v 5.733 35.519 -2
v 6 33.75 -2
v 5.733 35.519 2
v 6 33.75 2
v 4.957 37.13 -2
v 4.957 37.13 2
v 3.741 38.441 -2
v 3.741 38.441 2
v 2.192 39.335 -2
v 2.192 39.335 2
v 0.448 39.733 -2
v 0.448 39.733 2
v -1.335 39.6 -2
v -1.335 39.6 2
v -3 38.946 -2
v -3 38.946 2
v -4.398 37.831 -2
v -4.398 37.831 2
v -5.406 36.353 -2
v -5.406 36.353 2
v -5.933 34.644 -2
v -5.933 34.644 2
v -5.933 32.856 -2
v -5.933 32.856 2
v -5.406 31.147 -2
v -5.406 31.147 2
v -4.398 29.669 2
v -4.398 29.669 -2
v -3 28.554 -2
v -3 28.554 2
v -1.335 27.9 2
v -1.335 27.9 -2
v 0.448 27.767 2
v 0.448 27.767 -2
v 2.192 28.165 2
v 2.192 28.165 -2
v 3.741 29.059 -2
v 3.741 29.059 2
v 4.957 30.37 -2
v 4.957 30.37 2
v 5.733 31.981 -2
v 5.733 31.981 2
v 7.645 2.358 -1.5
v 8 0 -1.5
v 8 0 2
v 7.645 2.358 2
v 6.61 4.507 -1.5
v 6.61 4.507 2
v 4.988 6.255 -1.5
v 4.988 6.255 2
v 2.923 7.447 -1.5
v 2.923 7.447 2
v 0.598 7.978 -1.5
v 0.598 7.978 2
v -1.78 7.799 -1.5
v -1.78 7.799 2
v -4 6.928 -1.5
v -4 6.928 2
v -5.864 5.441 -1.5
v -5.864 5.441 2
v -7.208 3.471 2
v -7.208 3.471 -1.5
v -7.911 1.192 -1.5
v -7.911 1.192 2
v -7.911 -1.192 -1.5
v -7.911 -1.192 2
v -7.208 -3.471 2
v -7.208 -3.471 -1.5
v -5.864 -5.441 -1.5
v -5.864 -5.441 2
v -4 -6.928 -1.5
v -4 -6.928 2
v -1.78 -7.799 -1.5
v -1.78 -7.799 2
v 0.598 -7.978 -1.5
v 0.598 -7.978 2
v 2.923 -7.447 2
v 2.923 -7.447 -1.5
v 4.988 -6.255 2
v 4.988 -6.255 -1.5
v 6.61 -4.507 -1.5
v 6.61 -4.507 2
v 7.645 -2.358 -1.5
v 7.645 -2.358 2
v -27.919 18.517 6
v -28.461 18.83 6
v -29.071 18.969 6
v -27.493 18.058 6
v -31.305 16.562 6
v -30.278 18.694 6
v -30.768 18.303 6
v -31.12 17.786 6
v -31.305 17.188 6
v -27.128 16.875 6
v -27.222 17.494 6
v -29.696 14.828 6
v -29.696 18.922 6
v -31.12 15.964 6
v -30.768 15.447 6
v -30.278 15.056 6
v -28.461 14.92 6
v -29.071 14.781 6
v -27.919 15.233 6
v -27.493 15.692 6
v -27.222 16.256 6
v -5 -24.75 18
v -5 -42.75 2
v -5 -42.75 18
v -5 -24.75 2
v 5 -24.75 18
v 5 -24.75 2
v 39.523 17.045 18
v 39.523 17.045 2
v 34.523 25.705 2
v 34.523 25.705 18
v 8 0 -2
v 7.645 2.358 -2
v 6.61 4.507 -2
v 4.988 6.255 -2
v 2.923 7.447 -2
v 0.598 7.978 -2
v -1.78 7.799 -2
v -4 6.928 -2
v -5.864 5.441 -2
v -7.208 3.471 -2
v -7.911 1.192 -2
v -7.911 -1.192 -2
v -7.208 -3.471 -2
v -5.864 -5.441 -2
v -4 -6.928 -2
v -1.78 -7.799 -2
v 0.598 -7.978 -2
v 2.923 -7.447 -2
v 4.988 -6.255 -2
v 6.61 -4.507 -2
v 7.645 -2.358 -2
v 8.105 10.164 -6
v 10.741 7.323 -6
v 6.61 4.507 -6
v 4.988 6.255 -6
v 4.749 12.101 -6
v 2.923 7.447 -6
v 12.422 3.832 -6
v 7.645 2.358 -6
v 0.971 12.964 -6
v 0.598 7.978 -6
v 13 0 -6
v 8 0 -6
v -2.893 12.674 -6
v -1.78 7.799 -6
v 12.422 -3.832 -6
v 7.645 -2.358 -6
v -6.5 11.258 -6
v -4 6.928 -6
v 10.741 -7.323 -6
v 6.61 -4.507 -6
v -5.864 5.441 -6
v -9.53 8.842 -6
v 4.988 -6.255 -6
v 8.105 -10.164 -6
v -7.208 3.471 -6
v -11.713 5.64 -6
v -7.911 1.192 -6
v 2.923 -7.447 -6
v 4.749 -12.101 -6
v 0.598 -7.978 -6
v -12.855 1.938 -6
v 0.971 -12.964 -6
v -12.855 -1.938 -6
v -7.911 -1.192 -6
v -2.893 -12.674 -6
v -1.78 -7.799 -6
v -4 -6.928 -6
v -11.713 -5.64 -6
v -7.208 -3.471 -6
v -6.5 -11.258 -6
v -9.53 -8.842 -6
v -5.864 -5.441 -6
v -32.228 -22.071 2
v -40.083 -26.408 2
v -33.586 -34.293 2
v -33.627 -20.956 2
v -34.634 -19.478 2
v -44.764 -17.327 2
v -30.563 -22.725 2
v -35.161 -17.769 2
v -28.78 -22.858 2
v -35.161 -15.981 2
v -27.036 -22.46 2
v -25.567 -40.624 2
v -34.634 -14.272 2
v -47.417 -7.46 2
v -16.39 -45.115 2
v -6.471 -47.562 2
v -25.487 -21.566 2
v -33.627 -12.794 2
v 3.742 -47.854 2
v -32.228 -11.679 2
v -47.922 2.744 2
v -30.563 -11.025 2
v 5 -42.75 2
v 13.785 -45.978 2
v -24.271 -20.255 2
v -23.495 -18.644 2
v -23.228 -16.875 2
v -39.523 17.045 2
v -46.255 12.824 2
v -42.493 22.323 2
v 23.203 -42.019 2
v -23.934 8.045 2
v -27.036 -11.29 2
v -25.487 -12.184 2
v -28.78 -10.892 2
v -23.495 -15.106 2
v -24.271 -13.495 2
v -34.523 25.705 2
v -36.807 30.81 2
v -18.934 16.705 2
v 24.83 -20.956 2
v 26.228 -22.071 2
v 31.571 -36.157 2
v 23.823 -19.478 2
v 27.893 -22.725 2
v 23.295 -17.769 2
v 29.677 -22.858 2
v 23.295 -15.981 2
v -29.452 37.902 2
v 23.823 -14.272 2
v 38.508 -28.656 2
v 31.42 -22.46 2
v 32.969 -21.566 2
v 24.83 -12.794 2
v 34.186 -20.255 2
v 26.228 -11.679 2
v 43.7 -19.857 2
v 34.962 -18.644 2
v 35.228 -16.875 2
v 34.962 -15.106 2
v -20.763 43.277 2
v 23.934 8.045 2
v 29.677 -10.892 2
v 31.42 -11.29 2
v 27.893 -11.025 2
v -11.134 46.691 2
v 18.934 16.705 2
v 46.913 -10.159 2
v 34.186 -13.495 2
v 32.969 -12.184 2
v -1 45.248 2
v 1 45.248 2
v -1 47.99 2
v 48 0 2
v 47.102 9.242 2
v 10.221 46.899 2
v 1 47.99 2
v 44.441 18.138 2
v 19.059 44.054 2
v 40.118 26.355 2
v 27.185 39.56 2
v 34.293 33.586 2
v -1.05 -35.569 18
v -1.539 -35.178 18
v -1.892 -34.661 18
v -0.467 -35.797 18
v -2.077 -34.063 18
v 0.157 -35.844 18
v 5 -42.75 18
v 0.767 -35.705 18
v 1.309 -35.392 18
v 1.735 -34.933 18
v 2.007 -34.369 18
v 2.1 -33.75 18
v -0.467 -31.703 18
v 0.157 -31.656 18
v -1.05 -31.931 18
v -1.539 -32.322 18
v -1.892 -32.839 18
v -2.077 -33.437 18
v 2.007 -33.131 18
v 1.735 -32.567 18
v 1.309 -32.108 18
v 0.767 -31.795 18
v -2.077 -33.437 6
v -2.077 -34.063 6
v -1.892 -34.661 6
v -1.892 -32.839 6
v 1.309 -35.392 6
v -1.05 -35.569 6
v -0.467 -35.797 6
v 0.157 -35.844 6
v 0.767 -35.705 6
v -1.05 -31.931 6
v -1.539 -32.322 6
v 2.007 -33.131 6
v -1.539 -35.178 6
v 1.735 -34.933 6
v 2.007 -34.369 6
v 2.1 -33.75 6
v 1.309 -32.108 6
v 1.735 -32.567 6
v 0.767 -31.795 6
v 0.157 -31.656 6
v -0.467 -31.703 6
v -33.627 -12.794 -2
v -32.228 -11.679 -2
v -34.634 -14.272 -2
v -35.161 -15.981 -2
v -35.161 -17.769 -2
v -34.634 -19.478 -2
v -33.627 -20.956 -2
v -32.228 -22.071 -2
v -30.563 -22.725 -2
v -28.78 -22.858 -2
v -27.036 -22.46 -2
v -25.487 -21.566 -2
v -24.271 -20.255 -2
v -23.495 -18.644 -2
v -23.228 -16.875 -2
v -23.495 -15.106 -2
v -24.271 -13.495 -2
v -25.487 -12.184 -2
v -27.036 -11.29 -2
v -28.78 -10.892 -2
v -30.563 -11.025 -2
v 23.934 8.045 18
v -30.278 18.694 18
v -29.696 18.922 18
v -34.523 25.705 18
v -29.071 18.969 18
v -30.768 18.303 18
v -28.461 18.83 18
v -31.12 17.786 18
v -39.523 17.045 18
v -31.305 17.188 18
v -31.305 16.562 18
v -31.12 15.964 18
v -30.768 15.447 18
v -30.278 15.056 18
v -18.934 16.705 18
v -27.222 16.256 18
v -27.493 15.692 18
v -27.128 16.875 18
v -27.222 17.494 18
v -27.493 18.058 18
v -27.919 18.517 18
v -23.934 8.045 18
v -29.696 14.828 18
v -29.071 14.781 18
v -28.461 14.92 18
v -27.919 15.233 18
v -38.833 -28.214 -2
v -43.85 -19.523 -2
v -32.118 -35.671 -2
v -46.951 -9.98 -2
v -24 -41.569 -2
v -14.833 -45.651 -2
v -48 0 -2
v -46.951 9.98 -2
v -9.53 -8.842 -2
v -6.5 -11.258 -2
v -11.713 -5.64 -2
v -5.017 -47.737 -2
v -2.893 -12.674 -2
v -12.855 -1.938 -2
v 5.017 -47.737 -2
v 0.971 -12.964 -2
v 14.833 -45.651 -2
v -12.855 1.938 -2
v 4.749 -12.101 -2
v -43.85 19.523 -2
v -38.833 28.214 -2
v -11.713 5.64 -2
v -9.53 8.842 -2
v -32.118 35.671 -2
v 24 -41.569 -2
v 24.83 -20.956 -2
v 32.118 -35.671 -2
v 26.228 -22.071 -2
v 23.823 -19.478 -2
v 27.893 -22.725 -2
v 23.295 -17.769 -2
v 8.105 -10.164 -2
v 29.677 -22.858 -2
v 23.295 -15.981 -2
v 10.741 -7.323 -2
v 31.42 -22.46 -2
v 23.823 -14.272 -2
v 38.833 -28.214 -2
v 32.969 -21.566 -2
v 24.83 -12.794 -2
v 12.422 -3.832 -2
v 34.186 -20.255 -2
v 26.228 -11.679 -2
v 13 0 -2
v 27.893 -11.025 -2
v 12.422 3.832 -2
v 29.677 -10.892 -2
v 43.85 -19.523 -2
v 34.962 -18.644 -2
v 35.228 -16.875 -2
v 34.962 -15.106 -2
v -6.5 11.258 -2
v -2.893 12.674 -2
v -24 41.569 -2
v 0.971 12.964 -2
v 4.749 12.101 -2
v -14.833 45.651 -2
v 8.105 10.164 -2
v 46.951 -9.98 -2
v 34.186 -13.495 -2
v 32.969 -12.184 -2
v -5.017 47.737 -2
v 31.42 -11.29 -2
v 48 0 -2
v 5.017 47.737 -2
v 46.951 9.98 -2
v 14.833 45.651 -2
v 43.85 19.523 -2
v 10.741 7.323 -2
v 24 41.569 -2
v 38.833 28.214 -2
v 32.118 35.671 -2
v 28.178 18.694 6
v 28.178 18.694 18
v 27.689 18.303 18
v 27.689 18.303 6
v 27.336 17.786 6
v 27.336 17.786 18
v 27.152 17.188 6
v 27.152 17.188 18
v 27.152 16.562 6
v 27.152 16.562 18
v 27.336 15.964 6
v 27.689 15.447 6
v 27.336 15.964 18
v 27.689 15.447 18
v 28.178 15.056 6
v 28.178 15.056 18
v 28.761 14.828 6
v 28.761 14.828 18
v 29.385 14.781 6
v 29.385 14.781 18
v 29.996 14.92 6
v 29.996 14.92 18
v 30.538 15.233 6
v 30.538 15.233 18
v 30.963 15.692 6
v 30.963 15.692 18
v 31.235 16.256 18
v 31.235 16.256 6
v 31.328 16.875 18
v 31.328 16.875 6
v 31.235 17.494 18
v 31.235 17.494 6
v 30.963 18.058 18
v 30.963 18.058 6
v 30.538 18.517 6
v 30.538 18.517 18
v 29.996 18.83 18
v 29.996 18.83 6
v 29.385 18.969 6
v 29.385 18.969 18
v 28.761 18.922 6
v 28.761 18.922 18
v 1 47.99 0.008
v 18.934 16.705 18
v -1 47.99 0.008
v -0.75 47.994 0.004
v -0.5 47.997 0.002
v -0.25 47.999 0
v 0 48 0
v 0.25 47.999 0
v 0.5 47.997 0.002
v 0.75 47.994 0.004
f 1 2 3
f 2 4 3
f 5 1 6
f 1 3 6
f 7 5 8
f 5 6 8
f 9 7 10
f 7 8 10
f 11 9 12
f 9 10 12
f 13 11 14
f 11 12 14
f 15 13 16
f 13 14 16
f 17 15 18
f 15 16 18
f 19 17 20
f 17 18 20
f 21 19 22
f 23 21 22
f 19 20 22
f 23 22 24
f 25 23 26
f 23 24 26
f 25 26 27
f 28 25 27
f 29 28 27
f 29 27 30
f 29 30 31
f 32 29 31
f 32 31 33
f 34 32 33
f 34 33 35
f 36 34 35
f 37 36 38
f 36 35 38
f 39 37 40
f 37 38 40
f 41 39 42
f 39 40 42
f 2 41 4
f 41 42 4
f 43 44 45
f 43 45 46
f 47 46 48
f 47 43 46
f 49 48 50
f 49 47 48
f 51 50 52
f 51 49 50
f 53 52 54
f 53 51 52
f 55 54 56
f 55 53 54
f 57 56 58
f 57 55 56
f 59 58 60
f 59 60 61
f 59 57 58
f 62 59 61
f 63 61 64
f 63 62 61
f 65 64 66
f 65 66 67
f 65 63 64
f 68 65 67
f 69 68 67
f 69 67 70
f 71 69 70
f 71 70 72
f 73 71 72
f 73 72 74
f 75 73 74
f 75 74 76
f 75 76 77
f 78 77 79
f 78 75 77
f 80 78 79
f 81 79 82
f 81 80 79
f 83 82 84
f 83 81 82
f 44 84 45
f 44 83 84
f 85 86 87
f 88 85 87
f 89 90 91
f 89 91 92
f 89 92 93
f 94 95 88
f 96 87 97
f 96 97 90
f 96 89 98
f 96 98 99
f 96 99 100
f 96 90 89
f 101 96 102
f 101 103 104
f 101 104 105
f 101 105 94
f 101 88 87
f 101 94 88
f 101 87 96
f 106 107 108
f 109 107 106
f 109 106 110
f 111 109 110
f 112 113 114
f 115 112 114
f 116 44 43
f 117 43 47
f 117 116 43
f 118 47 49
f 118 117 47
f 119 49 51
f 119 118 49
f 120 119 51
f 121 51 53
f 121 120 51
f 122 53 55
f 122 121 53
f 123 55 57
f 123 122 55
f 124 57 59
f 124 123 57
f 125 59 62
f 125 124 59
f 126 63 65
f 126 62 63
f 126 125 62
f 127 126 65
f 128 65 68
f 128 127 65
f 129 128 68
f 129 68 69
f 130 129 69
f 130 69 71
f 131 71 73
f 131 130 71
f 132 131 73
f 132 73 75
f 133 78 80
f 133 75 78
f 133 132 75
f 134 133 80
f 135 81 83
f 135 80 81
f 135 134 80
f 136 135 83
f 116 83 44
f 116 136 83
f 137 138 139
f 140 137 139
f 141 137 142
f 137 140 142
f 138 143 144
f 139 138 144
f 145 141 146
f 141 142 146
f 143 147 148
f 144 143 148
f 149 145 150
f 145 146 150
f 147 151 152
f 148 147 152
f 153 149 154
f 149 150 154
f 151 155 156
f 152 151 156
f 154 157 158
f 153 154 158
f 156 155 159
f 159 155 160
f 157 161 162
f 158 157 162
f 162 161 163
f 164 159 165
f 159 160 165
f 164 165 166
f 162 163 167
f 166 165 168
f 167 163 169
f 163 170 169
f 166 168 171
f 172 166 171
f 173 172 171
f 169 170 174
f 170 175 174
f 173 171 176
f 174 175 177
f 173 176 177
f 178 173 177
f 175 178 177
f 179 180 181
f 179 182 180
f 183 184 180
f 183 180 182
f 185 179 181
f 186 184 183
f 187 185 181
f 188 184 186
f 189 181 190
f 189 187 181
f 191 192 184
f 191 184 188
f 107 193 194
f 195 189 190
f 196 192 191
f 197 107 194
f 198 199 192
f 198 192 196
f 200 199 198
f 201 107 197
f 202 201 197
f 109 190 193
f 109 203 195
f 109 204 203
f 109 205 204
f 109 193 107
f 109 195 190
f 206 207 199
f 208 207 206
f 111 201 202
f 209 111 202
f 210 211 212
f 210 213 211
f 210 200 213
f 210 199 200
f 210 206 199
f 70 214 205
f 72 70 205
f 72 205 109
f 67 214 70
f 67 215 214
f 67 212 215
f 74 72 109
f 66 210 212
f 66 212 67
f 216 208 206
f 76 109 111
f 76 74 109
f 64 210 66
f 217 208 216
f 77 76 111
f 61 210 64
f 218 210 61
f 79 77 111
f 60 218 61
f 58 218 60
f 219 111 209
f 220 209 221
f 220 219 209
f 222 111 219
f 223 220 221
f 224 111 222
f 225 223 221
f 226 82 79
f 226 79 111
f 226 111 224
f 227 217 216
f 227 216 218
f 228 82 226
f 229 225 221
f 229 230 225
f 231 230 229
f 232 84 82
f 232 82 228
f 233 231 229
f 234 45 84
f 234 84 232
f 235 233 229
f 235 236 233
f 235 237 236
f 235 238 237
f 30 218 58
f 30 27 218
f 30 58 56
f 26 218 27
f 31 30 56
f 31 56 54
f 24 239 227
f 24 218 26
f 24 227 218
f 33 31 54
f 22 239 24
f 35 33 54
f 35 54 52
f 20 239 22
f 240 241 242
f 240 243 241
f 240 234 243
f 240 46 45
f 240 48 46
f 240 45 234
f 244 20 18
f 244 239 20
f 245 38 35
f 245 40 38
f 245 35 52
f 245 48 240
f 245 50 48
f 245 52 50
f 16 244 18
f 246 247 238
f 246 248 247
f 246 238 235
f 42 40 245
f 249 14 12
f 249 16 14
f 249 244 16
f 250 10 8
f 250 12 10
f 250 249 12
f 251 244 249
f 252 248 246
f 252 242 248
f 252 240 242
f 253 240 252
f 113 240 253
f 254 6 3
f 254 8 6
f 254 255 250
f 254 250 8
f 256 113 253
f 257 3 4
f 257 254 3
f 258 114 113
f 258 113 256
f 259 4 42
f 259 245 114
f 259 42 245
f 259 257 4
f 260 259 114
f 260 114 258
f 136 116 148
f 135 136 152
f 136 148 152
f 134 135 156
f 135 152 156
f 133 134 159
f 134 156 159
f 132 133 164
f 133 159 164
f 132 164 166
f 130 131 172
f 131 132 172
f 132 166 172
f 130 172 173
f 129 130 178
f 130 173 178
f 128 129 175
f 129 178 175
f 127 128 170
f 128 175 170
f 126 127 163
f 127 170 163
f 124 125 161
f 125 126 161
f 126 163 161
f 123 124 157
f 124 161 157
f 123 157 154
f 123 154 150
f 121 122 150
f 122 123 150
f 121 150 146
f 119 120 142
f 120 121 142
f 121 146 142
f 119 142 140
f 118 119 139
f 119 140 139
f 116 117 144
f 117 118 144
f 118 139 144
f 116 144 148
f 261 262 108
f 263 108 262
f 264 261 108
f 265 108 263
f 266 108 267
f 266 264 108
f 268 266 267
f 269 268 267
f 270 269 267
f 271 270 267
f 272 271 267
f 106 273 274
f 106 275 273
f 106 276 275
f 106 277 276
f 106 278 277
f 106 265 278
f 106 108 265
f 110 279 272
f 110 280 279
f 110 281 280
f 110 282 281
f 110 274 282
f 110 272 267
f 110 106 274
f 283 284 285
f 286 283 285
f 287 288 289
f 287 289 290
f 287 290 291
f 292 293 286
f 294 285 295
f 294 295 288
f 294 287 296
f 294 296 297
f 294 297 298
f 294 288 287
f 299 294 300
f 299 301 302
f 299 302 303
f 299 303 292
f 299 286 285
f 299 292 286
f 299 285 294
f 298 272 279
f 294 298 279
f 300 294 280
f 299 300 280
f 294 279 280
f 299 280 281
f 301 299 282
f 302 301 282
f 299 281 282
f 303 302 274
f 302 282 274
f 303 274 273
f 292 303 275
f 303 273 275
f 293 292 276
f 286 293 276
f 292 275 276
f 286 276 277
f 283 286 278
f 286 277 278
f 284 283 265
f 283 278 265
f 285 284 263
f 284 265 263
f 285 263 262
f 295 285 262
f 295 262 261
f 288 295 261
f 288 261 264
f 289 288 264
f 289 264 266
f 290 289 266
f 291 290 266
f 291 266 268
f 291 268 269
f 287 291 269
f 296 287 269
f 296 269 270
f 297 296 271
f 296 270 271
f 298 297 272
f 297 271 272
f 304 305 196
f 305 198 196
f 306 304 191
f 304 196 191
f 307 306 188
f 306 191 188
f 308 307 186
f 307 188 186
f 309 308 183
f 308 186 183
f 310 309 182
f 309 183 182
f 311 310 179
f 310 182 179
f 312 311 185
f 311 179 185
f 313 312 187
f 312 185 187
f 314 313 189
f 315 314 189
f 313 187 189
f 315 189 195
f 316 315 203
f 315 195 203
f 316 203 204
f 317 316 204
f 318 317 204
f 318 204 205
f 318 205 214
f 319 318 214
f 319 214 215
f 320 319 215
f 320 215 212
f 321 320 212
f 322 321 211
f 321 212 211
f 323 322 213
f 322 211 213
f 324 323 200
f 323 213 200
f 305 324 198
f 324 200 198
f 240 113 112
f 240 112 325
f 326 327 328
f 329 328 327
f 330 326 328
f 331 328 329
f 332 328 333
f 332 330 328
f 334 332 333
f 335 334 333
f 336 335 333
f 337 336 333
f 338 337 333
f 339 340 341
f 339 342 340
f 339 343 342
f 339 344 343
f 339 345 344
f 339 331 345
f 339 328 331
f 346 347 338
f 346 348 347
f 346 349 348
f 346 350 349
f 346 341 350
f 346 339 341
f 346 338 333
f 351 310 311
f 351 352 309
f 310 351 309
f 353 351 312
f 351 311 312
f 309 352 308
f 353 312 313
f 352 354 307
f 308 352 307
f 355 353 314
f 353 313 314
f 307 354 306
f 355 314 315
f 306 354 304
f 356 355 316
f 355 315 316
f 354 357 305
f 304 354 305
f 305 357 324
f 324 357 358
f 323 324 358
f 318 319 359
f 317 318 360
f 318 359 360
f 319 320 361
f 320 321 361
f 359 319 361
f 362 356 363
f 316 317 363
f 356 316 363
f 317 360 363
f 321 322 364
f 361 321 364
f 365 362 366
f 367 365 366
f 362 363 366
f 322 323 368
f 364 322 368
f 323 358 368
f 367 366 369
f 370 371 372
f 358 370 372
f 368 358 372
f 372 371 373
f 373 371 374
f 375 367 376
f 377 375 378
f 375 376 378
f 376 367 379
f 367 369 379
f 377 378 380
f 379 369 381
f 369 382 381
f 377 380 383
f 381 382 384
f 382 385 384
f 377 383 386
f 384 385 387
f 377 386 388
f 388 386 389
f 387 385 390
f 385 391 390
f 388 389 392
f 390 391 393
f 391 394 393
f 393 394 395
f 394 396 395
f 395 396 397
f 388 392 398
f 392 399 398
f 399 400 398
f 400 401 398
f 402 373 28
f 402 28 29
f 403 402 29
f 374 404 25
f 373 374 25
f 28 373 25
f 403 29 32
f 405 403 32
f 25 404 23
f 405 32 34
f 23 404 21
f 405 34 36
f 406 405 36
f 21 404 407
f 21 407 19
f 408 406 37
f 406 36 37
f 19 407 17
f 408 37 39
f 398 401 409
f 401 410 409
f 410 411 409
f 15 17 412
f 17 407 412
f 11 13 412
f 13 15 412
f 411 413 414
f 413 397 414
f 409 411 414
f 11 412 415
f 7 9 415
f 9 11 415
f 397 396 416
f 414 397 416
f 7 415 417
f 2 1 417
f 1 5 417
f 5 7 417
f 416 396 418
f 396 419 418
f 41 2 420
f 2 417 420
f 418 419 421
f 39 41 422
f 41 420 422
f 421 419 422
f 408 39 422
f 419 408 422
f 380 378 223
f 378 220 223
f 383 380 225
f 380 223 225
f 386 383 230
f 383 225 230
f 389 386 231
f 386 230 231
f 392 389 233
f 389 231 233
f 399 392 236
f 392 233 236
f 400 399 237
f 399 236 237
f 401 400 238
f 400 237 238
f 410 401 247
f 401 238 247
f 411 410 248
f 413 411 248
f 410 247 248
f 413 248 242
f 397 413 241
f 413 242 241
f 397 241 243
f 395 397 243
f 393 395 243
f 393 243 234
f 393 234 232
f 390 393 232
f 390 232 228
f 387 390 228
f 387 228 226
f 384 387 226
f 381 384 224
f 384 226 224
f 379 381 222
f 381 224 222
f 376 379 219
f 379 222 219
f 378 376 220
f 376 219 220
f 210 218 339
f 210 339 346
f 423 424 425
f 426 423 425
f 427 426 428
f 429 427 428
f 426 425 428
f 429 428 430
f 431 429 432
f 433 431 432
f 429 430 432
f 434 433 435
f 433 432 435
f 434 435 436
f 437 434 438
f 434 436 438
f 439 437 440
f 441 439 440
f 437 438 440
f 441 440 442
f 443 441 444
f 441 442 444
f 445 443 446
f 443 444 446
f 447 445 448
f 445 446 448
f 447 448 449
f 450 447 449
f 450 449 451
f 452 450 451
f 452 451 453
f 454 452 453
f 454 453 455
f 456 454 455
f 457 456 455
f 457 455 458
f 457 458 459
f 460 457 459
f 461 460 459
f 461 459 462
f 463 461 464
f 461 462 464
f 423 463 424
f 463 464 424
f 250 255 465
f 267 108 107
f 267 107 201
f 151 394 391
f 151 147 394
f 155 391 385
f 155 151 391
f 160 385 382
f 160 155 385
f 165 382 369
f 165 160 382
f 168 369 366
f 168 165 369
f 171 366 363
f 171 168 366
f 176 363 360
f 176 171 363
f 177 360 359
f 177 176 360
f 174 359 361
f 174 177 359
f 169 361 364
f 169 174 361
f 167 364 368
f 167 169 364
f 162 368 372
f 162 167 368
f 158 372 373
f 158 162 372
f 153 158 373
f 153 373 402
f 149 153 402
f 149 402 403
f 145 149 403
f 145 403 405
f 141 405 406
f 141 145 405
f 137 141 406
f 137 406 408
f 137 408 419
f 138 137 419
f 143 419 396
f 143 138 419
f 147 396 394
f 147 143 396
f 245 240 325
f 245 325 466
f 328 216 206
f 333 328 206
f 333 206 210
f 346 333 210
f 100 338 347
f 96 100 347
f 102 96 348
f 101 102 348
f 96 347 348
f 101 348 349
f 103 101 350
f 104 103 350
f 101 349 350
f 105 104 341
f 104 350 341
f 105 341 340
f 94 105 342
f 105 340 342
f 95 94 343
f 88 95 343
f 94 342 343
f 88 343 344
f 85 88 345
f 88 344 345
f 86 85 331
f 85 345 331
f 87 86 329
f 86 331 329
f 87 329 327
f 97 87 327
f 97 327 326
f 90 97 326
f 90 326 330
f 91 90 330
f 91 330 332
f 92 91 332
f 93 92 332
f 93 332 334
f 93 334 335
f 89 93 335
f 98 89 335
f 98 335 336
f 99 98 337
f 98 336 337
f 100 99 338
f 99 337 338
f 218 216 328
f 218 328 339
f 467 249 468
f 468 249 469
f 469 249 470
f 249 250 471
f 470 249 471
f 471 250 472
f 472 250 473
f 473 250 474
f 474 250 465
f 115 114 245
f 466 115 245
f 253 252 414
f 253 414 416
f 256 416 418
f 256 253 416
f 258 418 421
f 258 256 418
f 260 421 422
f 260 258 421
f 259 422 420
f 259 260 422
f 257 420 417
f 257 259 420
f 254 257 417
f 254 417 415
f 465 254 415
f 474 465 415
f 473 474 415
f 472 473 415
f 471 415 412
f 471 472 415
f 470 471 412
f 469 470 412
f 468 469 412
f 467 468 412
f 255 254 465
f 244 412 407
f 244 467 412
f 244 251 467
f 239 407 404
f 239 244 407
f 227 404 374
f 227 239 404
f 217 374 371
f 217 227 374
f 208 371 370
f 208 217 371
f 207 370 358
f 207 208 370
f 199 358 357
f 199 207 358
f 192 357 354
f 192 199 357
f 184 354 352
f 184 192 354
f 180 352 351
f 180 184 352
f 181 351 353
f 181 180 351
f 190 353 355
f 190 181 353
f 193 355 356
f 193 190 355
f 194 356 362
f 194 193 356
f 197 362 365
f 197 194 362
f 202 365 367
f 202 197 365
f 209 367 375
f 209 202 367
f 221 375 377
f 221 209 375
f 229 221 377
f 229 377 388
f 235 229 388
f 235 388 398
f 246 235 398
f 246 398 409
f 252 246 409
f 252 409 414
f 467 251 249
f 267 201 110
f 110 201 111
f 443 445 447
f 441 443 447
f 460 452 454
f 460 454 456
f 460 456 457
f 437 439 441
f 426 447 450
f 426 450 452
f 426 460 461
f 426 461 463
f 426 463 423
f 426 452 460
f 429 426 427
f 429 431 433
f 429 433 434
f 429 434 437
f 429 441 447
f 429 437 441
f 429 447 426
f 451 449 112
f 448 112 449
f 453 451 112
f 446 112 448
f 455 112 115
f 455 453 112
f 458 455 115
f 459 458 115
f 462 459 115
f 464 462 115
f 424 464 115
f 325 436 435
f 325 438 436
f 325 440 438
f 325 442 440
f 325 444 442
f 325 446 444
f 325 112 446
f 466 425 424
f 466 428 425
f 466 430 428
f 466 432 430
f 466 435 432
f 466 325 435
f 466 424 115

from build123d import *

# Parameters (mm, degrees)
SKETCH1_R                        = 48
SKETCH1_R_2                      = 8
EX_CARRIER_FRONT_PLATE_4MM_DEPTH = 2
SKETCH2_R                        = 6
CUT_PIN_HOLE_12_DEPTH            = 69
PAT_PIN_HOLES_3X120_COUNT        = 3
CUT_EXTRUDE2_DEPTH               = 1
SKETCH5_W                        = 4.5
SKETCH5_H                        = 5
SKETCH6_W                        = 10
SKETCH6_H                        = 18
BOSS_EXTRUDE1_DEPTH              = 18
SKETCH7_R                        = 2.1
CUT_EXTRUDE4_DEPTH               = 12
CIRPATTERN1_COUNT                = 3
CIRPATTERN2_COUNT                = 3


with BuildPart() as part:
    # Sketch1 → EX_Carrier_Front_Plate_4mm (new, symmetric)
    with BuildSketch(Plane.XY):
        Circle(SKETCH1_R)
        Circle(SKETCH1_R_2, mode=Mode.SUBTRACT)
    extrude(amount=EX_CARRIER_FRONT_PLATE_4MM_DEPTH, both=True)

    # Sketch2 → CUT_Pin_Hole_Ø12 (cut, symmetric)
    with BuildSketch(Plane.XY.offset(2)):
        with Locations((0, 33.75)):
            Circle(SKETCH2_R)
    cut_pin_hole_12 = extrude(amount=CUT_PIN_HOLE_12_DEPTH, both=True, mode=Mode.SUBTRACT)

    # PAT_Pin_Holes_3x120: CUT_Pin_Hole_Ø12 ×3 about axis
    pat_pin_holes_3x120_axis = Axis((0, 0, 2), (0, 0, 1))
    for i in range(1, PAT_PIN_HOLES_3X120_COUNT):
        add(cut_pin_hole_12.rotate(pat_pin_holes_3x120_axis, i * 360 / PAT_PIN_HOLES_3X120_COUNT), mode=Mode.SUBTRACT)

    # Sketch4 → Cut-Extrude2 (cut, symmetric)
    with BuildSketch(Plane(origin=(0, 0, 0), x_dir=(0, 0, -1), z_dir=(1, 0, 0))):
        Polygon((-2, 45.247745673), (0, 48), (-2, 48), align=None)
    extrude(amount=CUT_EXTRUDE2_DEPTH, both=True, mode=Mode.SUBTRACT)

    # Sketch5 → Revolve1 (revolve)
    with BuildSketch(Plane(origin=(0, 0, 0), x_dir=(0, 0, -1), z_dir=(1, 0, 0))):
        with Locations((3.75, 10.5)):
            Rectangle(SKETCH5_W, SKETCH5_H)
    revolve(axis=Axis((0, 0, 0), (0, 0, -1)))

    # Sketch6 → Boss-Extrude1 (add)
    with BuildSketch(Plane.XY):
        with Locations((0, -33.75)):
            Rectangle(SKETCH6_W, SKETCH6_H)
    boss_extrude1 = extrude(amount=BOSS_EXTRUDE1_DEPTH)

    # Sketch7 → Cut-Extrude4 (cut)
    with BuildSketch(Plane.XY.offset(18)):
        with Locations((0, -33.75)):
            Circle(SKETCH7_R)
    cut_extrude4 = extrude(amount=-CUT_EXTRUDE4_DEPTH, mode=Mode.SUBTRACT)

    # CirPattern1: Boss-Extrude1 ×3 about axis
    cirpattern1_axis = Axis((0, 0, -6.408265016), (0, 0, 1))
    for i in range(1, CIRPATTERN1_COUNT):
        add(boss_extrude1.rotate(cirpattern1_axis, i * 360 / CIRPATTERN1_COUNT))

    # CirPattern2: Cut-Extrude4 ×3 about axis
    cirpattern2_axis = Axis((0, 0, -6.408265016), (0, 0, 1))
    for i in range(1, CIRPATTERN2_COUNT):
        add(cut_extrude4.rotate(cirpattern2_axis, i * 360 / CIRPATTERN2_COUNT), mode=Mode.SUBTRACT)


solid = part.part
